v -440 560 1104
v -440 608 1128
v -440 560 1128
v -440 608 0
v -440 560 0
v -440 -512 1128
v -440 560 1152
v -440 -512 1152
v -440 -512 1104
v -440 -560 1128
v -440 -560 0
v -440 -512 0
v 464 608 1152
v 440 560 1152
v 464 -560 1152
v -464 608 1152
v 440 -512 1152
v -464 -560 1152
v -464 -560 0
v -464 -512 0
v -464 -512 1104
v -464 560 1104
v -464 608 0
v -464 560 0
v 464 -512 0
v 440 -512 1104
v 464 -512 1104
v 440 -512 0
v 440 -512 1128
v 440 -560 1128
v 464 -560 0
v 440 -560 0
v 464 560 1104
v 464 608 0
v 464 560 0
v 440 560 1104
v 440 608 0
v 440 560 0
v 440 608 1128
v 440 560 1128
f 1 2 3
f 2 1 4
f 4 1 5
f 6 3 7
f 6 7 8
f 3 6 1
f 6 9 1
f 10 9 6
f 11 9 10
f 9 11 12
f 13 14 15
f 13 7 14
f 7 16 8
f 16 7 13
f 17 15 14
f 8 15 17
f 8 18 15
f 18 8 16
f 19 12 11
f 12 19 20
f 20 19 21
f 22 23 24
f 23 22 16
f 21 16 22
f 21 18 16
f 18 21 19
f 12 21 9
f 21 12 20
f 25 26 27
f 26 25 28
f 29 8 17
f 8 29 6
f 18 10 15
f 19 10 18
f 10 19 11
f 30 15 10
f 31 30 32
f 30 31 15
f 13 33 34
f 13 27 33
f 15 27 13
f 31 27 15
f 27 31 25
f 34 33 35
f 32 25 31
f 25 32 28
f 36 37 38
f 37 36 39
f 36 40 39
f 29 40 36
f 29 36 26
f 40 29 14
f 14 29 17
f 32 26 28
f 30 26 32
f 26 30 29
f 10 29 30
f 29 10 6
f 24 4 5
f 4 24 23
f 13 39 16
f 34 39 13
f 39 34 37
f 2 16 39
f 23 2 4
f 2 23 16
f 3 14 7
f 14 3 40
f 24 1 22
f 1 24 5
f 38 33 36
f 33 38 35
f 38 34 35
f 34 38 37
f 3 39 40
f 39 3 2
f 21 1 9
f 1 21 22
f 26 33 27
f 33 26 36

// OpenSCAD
// LetterBlock.scad - Basic usage of text() and linear_extrude()

// Module instantiation
//LetterBlock("M");

// Module definition.
// size=30 defines an optional parameter with a default value.
//module LetterBlock(letter, size=30) {
//    difference() {
//        translate([0,0,size/4]) cube([size,size/16,size/8], center=true);
//    }
//}

//echo(version=version());
// Written by Marius Kintel <marius@kintel.net>
//
// To the extent possible under law, the author(s) have dedicated all
// copyright and related and neighboring rights to this software to the
// public domain worldwide. This software is distributed without any
// warranty.
//
// You should have received a copy of the CC0 Public Domain
// Dedication along with this software.
// If not, see <http://creativecommons.org/publicdomain/zero/1.0/>.

scale = 32;

firWidth = (3 / 4) * scale;
firHeight = (3 / 2) * scale;
height = 36 * scale;
width = 29 * scale;
length = 35 * scale;

module strip(firLen)
{
    cube([firWidth,firHeight,firLen]);
}

module invu(width, height)
{
    strip(height);
    translate([width - firWidth,0,0])
    {
        strip(height);
    }
    translate([0,0,height])
    {
        rotate([0,90,0])
        {
            strip(width);
        }
    }
}

module parallels(length,width,height)
{
    translate([0,length,height])
    {
        rotate([90,0,0])
        {
            strip(length);
            translate([width - firWidth,0,0])
            {
                strip(length);
            }
        }
    }
}

module frame(length,width,height)
{
    invu(width,height);
    translate([0,length,0])
    {
        invu(width,height);
    }
    translate([])
    {
        parallels(length,width,height - firHeight);
    }
}

translate([-(width / 2),-(length / 2),0])
{
    frame(length,width,height);
}
